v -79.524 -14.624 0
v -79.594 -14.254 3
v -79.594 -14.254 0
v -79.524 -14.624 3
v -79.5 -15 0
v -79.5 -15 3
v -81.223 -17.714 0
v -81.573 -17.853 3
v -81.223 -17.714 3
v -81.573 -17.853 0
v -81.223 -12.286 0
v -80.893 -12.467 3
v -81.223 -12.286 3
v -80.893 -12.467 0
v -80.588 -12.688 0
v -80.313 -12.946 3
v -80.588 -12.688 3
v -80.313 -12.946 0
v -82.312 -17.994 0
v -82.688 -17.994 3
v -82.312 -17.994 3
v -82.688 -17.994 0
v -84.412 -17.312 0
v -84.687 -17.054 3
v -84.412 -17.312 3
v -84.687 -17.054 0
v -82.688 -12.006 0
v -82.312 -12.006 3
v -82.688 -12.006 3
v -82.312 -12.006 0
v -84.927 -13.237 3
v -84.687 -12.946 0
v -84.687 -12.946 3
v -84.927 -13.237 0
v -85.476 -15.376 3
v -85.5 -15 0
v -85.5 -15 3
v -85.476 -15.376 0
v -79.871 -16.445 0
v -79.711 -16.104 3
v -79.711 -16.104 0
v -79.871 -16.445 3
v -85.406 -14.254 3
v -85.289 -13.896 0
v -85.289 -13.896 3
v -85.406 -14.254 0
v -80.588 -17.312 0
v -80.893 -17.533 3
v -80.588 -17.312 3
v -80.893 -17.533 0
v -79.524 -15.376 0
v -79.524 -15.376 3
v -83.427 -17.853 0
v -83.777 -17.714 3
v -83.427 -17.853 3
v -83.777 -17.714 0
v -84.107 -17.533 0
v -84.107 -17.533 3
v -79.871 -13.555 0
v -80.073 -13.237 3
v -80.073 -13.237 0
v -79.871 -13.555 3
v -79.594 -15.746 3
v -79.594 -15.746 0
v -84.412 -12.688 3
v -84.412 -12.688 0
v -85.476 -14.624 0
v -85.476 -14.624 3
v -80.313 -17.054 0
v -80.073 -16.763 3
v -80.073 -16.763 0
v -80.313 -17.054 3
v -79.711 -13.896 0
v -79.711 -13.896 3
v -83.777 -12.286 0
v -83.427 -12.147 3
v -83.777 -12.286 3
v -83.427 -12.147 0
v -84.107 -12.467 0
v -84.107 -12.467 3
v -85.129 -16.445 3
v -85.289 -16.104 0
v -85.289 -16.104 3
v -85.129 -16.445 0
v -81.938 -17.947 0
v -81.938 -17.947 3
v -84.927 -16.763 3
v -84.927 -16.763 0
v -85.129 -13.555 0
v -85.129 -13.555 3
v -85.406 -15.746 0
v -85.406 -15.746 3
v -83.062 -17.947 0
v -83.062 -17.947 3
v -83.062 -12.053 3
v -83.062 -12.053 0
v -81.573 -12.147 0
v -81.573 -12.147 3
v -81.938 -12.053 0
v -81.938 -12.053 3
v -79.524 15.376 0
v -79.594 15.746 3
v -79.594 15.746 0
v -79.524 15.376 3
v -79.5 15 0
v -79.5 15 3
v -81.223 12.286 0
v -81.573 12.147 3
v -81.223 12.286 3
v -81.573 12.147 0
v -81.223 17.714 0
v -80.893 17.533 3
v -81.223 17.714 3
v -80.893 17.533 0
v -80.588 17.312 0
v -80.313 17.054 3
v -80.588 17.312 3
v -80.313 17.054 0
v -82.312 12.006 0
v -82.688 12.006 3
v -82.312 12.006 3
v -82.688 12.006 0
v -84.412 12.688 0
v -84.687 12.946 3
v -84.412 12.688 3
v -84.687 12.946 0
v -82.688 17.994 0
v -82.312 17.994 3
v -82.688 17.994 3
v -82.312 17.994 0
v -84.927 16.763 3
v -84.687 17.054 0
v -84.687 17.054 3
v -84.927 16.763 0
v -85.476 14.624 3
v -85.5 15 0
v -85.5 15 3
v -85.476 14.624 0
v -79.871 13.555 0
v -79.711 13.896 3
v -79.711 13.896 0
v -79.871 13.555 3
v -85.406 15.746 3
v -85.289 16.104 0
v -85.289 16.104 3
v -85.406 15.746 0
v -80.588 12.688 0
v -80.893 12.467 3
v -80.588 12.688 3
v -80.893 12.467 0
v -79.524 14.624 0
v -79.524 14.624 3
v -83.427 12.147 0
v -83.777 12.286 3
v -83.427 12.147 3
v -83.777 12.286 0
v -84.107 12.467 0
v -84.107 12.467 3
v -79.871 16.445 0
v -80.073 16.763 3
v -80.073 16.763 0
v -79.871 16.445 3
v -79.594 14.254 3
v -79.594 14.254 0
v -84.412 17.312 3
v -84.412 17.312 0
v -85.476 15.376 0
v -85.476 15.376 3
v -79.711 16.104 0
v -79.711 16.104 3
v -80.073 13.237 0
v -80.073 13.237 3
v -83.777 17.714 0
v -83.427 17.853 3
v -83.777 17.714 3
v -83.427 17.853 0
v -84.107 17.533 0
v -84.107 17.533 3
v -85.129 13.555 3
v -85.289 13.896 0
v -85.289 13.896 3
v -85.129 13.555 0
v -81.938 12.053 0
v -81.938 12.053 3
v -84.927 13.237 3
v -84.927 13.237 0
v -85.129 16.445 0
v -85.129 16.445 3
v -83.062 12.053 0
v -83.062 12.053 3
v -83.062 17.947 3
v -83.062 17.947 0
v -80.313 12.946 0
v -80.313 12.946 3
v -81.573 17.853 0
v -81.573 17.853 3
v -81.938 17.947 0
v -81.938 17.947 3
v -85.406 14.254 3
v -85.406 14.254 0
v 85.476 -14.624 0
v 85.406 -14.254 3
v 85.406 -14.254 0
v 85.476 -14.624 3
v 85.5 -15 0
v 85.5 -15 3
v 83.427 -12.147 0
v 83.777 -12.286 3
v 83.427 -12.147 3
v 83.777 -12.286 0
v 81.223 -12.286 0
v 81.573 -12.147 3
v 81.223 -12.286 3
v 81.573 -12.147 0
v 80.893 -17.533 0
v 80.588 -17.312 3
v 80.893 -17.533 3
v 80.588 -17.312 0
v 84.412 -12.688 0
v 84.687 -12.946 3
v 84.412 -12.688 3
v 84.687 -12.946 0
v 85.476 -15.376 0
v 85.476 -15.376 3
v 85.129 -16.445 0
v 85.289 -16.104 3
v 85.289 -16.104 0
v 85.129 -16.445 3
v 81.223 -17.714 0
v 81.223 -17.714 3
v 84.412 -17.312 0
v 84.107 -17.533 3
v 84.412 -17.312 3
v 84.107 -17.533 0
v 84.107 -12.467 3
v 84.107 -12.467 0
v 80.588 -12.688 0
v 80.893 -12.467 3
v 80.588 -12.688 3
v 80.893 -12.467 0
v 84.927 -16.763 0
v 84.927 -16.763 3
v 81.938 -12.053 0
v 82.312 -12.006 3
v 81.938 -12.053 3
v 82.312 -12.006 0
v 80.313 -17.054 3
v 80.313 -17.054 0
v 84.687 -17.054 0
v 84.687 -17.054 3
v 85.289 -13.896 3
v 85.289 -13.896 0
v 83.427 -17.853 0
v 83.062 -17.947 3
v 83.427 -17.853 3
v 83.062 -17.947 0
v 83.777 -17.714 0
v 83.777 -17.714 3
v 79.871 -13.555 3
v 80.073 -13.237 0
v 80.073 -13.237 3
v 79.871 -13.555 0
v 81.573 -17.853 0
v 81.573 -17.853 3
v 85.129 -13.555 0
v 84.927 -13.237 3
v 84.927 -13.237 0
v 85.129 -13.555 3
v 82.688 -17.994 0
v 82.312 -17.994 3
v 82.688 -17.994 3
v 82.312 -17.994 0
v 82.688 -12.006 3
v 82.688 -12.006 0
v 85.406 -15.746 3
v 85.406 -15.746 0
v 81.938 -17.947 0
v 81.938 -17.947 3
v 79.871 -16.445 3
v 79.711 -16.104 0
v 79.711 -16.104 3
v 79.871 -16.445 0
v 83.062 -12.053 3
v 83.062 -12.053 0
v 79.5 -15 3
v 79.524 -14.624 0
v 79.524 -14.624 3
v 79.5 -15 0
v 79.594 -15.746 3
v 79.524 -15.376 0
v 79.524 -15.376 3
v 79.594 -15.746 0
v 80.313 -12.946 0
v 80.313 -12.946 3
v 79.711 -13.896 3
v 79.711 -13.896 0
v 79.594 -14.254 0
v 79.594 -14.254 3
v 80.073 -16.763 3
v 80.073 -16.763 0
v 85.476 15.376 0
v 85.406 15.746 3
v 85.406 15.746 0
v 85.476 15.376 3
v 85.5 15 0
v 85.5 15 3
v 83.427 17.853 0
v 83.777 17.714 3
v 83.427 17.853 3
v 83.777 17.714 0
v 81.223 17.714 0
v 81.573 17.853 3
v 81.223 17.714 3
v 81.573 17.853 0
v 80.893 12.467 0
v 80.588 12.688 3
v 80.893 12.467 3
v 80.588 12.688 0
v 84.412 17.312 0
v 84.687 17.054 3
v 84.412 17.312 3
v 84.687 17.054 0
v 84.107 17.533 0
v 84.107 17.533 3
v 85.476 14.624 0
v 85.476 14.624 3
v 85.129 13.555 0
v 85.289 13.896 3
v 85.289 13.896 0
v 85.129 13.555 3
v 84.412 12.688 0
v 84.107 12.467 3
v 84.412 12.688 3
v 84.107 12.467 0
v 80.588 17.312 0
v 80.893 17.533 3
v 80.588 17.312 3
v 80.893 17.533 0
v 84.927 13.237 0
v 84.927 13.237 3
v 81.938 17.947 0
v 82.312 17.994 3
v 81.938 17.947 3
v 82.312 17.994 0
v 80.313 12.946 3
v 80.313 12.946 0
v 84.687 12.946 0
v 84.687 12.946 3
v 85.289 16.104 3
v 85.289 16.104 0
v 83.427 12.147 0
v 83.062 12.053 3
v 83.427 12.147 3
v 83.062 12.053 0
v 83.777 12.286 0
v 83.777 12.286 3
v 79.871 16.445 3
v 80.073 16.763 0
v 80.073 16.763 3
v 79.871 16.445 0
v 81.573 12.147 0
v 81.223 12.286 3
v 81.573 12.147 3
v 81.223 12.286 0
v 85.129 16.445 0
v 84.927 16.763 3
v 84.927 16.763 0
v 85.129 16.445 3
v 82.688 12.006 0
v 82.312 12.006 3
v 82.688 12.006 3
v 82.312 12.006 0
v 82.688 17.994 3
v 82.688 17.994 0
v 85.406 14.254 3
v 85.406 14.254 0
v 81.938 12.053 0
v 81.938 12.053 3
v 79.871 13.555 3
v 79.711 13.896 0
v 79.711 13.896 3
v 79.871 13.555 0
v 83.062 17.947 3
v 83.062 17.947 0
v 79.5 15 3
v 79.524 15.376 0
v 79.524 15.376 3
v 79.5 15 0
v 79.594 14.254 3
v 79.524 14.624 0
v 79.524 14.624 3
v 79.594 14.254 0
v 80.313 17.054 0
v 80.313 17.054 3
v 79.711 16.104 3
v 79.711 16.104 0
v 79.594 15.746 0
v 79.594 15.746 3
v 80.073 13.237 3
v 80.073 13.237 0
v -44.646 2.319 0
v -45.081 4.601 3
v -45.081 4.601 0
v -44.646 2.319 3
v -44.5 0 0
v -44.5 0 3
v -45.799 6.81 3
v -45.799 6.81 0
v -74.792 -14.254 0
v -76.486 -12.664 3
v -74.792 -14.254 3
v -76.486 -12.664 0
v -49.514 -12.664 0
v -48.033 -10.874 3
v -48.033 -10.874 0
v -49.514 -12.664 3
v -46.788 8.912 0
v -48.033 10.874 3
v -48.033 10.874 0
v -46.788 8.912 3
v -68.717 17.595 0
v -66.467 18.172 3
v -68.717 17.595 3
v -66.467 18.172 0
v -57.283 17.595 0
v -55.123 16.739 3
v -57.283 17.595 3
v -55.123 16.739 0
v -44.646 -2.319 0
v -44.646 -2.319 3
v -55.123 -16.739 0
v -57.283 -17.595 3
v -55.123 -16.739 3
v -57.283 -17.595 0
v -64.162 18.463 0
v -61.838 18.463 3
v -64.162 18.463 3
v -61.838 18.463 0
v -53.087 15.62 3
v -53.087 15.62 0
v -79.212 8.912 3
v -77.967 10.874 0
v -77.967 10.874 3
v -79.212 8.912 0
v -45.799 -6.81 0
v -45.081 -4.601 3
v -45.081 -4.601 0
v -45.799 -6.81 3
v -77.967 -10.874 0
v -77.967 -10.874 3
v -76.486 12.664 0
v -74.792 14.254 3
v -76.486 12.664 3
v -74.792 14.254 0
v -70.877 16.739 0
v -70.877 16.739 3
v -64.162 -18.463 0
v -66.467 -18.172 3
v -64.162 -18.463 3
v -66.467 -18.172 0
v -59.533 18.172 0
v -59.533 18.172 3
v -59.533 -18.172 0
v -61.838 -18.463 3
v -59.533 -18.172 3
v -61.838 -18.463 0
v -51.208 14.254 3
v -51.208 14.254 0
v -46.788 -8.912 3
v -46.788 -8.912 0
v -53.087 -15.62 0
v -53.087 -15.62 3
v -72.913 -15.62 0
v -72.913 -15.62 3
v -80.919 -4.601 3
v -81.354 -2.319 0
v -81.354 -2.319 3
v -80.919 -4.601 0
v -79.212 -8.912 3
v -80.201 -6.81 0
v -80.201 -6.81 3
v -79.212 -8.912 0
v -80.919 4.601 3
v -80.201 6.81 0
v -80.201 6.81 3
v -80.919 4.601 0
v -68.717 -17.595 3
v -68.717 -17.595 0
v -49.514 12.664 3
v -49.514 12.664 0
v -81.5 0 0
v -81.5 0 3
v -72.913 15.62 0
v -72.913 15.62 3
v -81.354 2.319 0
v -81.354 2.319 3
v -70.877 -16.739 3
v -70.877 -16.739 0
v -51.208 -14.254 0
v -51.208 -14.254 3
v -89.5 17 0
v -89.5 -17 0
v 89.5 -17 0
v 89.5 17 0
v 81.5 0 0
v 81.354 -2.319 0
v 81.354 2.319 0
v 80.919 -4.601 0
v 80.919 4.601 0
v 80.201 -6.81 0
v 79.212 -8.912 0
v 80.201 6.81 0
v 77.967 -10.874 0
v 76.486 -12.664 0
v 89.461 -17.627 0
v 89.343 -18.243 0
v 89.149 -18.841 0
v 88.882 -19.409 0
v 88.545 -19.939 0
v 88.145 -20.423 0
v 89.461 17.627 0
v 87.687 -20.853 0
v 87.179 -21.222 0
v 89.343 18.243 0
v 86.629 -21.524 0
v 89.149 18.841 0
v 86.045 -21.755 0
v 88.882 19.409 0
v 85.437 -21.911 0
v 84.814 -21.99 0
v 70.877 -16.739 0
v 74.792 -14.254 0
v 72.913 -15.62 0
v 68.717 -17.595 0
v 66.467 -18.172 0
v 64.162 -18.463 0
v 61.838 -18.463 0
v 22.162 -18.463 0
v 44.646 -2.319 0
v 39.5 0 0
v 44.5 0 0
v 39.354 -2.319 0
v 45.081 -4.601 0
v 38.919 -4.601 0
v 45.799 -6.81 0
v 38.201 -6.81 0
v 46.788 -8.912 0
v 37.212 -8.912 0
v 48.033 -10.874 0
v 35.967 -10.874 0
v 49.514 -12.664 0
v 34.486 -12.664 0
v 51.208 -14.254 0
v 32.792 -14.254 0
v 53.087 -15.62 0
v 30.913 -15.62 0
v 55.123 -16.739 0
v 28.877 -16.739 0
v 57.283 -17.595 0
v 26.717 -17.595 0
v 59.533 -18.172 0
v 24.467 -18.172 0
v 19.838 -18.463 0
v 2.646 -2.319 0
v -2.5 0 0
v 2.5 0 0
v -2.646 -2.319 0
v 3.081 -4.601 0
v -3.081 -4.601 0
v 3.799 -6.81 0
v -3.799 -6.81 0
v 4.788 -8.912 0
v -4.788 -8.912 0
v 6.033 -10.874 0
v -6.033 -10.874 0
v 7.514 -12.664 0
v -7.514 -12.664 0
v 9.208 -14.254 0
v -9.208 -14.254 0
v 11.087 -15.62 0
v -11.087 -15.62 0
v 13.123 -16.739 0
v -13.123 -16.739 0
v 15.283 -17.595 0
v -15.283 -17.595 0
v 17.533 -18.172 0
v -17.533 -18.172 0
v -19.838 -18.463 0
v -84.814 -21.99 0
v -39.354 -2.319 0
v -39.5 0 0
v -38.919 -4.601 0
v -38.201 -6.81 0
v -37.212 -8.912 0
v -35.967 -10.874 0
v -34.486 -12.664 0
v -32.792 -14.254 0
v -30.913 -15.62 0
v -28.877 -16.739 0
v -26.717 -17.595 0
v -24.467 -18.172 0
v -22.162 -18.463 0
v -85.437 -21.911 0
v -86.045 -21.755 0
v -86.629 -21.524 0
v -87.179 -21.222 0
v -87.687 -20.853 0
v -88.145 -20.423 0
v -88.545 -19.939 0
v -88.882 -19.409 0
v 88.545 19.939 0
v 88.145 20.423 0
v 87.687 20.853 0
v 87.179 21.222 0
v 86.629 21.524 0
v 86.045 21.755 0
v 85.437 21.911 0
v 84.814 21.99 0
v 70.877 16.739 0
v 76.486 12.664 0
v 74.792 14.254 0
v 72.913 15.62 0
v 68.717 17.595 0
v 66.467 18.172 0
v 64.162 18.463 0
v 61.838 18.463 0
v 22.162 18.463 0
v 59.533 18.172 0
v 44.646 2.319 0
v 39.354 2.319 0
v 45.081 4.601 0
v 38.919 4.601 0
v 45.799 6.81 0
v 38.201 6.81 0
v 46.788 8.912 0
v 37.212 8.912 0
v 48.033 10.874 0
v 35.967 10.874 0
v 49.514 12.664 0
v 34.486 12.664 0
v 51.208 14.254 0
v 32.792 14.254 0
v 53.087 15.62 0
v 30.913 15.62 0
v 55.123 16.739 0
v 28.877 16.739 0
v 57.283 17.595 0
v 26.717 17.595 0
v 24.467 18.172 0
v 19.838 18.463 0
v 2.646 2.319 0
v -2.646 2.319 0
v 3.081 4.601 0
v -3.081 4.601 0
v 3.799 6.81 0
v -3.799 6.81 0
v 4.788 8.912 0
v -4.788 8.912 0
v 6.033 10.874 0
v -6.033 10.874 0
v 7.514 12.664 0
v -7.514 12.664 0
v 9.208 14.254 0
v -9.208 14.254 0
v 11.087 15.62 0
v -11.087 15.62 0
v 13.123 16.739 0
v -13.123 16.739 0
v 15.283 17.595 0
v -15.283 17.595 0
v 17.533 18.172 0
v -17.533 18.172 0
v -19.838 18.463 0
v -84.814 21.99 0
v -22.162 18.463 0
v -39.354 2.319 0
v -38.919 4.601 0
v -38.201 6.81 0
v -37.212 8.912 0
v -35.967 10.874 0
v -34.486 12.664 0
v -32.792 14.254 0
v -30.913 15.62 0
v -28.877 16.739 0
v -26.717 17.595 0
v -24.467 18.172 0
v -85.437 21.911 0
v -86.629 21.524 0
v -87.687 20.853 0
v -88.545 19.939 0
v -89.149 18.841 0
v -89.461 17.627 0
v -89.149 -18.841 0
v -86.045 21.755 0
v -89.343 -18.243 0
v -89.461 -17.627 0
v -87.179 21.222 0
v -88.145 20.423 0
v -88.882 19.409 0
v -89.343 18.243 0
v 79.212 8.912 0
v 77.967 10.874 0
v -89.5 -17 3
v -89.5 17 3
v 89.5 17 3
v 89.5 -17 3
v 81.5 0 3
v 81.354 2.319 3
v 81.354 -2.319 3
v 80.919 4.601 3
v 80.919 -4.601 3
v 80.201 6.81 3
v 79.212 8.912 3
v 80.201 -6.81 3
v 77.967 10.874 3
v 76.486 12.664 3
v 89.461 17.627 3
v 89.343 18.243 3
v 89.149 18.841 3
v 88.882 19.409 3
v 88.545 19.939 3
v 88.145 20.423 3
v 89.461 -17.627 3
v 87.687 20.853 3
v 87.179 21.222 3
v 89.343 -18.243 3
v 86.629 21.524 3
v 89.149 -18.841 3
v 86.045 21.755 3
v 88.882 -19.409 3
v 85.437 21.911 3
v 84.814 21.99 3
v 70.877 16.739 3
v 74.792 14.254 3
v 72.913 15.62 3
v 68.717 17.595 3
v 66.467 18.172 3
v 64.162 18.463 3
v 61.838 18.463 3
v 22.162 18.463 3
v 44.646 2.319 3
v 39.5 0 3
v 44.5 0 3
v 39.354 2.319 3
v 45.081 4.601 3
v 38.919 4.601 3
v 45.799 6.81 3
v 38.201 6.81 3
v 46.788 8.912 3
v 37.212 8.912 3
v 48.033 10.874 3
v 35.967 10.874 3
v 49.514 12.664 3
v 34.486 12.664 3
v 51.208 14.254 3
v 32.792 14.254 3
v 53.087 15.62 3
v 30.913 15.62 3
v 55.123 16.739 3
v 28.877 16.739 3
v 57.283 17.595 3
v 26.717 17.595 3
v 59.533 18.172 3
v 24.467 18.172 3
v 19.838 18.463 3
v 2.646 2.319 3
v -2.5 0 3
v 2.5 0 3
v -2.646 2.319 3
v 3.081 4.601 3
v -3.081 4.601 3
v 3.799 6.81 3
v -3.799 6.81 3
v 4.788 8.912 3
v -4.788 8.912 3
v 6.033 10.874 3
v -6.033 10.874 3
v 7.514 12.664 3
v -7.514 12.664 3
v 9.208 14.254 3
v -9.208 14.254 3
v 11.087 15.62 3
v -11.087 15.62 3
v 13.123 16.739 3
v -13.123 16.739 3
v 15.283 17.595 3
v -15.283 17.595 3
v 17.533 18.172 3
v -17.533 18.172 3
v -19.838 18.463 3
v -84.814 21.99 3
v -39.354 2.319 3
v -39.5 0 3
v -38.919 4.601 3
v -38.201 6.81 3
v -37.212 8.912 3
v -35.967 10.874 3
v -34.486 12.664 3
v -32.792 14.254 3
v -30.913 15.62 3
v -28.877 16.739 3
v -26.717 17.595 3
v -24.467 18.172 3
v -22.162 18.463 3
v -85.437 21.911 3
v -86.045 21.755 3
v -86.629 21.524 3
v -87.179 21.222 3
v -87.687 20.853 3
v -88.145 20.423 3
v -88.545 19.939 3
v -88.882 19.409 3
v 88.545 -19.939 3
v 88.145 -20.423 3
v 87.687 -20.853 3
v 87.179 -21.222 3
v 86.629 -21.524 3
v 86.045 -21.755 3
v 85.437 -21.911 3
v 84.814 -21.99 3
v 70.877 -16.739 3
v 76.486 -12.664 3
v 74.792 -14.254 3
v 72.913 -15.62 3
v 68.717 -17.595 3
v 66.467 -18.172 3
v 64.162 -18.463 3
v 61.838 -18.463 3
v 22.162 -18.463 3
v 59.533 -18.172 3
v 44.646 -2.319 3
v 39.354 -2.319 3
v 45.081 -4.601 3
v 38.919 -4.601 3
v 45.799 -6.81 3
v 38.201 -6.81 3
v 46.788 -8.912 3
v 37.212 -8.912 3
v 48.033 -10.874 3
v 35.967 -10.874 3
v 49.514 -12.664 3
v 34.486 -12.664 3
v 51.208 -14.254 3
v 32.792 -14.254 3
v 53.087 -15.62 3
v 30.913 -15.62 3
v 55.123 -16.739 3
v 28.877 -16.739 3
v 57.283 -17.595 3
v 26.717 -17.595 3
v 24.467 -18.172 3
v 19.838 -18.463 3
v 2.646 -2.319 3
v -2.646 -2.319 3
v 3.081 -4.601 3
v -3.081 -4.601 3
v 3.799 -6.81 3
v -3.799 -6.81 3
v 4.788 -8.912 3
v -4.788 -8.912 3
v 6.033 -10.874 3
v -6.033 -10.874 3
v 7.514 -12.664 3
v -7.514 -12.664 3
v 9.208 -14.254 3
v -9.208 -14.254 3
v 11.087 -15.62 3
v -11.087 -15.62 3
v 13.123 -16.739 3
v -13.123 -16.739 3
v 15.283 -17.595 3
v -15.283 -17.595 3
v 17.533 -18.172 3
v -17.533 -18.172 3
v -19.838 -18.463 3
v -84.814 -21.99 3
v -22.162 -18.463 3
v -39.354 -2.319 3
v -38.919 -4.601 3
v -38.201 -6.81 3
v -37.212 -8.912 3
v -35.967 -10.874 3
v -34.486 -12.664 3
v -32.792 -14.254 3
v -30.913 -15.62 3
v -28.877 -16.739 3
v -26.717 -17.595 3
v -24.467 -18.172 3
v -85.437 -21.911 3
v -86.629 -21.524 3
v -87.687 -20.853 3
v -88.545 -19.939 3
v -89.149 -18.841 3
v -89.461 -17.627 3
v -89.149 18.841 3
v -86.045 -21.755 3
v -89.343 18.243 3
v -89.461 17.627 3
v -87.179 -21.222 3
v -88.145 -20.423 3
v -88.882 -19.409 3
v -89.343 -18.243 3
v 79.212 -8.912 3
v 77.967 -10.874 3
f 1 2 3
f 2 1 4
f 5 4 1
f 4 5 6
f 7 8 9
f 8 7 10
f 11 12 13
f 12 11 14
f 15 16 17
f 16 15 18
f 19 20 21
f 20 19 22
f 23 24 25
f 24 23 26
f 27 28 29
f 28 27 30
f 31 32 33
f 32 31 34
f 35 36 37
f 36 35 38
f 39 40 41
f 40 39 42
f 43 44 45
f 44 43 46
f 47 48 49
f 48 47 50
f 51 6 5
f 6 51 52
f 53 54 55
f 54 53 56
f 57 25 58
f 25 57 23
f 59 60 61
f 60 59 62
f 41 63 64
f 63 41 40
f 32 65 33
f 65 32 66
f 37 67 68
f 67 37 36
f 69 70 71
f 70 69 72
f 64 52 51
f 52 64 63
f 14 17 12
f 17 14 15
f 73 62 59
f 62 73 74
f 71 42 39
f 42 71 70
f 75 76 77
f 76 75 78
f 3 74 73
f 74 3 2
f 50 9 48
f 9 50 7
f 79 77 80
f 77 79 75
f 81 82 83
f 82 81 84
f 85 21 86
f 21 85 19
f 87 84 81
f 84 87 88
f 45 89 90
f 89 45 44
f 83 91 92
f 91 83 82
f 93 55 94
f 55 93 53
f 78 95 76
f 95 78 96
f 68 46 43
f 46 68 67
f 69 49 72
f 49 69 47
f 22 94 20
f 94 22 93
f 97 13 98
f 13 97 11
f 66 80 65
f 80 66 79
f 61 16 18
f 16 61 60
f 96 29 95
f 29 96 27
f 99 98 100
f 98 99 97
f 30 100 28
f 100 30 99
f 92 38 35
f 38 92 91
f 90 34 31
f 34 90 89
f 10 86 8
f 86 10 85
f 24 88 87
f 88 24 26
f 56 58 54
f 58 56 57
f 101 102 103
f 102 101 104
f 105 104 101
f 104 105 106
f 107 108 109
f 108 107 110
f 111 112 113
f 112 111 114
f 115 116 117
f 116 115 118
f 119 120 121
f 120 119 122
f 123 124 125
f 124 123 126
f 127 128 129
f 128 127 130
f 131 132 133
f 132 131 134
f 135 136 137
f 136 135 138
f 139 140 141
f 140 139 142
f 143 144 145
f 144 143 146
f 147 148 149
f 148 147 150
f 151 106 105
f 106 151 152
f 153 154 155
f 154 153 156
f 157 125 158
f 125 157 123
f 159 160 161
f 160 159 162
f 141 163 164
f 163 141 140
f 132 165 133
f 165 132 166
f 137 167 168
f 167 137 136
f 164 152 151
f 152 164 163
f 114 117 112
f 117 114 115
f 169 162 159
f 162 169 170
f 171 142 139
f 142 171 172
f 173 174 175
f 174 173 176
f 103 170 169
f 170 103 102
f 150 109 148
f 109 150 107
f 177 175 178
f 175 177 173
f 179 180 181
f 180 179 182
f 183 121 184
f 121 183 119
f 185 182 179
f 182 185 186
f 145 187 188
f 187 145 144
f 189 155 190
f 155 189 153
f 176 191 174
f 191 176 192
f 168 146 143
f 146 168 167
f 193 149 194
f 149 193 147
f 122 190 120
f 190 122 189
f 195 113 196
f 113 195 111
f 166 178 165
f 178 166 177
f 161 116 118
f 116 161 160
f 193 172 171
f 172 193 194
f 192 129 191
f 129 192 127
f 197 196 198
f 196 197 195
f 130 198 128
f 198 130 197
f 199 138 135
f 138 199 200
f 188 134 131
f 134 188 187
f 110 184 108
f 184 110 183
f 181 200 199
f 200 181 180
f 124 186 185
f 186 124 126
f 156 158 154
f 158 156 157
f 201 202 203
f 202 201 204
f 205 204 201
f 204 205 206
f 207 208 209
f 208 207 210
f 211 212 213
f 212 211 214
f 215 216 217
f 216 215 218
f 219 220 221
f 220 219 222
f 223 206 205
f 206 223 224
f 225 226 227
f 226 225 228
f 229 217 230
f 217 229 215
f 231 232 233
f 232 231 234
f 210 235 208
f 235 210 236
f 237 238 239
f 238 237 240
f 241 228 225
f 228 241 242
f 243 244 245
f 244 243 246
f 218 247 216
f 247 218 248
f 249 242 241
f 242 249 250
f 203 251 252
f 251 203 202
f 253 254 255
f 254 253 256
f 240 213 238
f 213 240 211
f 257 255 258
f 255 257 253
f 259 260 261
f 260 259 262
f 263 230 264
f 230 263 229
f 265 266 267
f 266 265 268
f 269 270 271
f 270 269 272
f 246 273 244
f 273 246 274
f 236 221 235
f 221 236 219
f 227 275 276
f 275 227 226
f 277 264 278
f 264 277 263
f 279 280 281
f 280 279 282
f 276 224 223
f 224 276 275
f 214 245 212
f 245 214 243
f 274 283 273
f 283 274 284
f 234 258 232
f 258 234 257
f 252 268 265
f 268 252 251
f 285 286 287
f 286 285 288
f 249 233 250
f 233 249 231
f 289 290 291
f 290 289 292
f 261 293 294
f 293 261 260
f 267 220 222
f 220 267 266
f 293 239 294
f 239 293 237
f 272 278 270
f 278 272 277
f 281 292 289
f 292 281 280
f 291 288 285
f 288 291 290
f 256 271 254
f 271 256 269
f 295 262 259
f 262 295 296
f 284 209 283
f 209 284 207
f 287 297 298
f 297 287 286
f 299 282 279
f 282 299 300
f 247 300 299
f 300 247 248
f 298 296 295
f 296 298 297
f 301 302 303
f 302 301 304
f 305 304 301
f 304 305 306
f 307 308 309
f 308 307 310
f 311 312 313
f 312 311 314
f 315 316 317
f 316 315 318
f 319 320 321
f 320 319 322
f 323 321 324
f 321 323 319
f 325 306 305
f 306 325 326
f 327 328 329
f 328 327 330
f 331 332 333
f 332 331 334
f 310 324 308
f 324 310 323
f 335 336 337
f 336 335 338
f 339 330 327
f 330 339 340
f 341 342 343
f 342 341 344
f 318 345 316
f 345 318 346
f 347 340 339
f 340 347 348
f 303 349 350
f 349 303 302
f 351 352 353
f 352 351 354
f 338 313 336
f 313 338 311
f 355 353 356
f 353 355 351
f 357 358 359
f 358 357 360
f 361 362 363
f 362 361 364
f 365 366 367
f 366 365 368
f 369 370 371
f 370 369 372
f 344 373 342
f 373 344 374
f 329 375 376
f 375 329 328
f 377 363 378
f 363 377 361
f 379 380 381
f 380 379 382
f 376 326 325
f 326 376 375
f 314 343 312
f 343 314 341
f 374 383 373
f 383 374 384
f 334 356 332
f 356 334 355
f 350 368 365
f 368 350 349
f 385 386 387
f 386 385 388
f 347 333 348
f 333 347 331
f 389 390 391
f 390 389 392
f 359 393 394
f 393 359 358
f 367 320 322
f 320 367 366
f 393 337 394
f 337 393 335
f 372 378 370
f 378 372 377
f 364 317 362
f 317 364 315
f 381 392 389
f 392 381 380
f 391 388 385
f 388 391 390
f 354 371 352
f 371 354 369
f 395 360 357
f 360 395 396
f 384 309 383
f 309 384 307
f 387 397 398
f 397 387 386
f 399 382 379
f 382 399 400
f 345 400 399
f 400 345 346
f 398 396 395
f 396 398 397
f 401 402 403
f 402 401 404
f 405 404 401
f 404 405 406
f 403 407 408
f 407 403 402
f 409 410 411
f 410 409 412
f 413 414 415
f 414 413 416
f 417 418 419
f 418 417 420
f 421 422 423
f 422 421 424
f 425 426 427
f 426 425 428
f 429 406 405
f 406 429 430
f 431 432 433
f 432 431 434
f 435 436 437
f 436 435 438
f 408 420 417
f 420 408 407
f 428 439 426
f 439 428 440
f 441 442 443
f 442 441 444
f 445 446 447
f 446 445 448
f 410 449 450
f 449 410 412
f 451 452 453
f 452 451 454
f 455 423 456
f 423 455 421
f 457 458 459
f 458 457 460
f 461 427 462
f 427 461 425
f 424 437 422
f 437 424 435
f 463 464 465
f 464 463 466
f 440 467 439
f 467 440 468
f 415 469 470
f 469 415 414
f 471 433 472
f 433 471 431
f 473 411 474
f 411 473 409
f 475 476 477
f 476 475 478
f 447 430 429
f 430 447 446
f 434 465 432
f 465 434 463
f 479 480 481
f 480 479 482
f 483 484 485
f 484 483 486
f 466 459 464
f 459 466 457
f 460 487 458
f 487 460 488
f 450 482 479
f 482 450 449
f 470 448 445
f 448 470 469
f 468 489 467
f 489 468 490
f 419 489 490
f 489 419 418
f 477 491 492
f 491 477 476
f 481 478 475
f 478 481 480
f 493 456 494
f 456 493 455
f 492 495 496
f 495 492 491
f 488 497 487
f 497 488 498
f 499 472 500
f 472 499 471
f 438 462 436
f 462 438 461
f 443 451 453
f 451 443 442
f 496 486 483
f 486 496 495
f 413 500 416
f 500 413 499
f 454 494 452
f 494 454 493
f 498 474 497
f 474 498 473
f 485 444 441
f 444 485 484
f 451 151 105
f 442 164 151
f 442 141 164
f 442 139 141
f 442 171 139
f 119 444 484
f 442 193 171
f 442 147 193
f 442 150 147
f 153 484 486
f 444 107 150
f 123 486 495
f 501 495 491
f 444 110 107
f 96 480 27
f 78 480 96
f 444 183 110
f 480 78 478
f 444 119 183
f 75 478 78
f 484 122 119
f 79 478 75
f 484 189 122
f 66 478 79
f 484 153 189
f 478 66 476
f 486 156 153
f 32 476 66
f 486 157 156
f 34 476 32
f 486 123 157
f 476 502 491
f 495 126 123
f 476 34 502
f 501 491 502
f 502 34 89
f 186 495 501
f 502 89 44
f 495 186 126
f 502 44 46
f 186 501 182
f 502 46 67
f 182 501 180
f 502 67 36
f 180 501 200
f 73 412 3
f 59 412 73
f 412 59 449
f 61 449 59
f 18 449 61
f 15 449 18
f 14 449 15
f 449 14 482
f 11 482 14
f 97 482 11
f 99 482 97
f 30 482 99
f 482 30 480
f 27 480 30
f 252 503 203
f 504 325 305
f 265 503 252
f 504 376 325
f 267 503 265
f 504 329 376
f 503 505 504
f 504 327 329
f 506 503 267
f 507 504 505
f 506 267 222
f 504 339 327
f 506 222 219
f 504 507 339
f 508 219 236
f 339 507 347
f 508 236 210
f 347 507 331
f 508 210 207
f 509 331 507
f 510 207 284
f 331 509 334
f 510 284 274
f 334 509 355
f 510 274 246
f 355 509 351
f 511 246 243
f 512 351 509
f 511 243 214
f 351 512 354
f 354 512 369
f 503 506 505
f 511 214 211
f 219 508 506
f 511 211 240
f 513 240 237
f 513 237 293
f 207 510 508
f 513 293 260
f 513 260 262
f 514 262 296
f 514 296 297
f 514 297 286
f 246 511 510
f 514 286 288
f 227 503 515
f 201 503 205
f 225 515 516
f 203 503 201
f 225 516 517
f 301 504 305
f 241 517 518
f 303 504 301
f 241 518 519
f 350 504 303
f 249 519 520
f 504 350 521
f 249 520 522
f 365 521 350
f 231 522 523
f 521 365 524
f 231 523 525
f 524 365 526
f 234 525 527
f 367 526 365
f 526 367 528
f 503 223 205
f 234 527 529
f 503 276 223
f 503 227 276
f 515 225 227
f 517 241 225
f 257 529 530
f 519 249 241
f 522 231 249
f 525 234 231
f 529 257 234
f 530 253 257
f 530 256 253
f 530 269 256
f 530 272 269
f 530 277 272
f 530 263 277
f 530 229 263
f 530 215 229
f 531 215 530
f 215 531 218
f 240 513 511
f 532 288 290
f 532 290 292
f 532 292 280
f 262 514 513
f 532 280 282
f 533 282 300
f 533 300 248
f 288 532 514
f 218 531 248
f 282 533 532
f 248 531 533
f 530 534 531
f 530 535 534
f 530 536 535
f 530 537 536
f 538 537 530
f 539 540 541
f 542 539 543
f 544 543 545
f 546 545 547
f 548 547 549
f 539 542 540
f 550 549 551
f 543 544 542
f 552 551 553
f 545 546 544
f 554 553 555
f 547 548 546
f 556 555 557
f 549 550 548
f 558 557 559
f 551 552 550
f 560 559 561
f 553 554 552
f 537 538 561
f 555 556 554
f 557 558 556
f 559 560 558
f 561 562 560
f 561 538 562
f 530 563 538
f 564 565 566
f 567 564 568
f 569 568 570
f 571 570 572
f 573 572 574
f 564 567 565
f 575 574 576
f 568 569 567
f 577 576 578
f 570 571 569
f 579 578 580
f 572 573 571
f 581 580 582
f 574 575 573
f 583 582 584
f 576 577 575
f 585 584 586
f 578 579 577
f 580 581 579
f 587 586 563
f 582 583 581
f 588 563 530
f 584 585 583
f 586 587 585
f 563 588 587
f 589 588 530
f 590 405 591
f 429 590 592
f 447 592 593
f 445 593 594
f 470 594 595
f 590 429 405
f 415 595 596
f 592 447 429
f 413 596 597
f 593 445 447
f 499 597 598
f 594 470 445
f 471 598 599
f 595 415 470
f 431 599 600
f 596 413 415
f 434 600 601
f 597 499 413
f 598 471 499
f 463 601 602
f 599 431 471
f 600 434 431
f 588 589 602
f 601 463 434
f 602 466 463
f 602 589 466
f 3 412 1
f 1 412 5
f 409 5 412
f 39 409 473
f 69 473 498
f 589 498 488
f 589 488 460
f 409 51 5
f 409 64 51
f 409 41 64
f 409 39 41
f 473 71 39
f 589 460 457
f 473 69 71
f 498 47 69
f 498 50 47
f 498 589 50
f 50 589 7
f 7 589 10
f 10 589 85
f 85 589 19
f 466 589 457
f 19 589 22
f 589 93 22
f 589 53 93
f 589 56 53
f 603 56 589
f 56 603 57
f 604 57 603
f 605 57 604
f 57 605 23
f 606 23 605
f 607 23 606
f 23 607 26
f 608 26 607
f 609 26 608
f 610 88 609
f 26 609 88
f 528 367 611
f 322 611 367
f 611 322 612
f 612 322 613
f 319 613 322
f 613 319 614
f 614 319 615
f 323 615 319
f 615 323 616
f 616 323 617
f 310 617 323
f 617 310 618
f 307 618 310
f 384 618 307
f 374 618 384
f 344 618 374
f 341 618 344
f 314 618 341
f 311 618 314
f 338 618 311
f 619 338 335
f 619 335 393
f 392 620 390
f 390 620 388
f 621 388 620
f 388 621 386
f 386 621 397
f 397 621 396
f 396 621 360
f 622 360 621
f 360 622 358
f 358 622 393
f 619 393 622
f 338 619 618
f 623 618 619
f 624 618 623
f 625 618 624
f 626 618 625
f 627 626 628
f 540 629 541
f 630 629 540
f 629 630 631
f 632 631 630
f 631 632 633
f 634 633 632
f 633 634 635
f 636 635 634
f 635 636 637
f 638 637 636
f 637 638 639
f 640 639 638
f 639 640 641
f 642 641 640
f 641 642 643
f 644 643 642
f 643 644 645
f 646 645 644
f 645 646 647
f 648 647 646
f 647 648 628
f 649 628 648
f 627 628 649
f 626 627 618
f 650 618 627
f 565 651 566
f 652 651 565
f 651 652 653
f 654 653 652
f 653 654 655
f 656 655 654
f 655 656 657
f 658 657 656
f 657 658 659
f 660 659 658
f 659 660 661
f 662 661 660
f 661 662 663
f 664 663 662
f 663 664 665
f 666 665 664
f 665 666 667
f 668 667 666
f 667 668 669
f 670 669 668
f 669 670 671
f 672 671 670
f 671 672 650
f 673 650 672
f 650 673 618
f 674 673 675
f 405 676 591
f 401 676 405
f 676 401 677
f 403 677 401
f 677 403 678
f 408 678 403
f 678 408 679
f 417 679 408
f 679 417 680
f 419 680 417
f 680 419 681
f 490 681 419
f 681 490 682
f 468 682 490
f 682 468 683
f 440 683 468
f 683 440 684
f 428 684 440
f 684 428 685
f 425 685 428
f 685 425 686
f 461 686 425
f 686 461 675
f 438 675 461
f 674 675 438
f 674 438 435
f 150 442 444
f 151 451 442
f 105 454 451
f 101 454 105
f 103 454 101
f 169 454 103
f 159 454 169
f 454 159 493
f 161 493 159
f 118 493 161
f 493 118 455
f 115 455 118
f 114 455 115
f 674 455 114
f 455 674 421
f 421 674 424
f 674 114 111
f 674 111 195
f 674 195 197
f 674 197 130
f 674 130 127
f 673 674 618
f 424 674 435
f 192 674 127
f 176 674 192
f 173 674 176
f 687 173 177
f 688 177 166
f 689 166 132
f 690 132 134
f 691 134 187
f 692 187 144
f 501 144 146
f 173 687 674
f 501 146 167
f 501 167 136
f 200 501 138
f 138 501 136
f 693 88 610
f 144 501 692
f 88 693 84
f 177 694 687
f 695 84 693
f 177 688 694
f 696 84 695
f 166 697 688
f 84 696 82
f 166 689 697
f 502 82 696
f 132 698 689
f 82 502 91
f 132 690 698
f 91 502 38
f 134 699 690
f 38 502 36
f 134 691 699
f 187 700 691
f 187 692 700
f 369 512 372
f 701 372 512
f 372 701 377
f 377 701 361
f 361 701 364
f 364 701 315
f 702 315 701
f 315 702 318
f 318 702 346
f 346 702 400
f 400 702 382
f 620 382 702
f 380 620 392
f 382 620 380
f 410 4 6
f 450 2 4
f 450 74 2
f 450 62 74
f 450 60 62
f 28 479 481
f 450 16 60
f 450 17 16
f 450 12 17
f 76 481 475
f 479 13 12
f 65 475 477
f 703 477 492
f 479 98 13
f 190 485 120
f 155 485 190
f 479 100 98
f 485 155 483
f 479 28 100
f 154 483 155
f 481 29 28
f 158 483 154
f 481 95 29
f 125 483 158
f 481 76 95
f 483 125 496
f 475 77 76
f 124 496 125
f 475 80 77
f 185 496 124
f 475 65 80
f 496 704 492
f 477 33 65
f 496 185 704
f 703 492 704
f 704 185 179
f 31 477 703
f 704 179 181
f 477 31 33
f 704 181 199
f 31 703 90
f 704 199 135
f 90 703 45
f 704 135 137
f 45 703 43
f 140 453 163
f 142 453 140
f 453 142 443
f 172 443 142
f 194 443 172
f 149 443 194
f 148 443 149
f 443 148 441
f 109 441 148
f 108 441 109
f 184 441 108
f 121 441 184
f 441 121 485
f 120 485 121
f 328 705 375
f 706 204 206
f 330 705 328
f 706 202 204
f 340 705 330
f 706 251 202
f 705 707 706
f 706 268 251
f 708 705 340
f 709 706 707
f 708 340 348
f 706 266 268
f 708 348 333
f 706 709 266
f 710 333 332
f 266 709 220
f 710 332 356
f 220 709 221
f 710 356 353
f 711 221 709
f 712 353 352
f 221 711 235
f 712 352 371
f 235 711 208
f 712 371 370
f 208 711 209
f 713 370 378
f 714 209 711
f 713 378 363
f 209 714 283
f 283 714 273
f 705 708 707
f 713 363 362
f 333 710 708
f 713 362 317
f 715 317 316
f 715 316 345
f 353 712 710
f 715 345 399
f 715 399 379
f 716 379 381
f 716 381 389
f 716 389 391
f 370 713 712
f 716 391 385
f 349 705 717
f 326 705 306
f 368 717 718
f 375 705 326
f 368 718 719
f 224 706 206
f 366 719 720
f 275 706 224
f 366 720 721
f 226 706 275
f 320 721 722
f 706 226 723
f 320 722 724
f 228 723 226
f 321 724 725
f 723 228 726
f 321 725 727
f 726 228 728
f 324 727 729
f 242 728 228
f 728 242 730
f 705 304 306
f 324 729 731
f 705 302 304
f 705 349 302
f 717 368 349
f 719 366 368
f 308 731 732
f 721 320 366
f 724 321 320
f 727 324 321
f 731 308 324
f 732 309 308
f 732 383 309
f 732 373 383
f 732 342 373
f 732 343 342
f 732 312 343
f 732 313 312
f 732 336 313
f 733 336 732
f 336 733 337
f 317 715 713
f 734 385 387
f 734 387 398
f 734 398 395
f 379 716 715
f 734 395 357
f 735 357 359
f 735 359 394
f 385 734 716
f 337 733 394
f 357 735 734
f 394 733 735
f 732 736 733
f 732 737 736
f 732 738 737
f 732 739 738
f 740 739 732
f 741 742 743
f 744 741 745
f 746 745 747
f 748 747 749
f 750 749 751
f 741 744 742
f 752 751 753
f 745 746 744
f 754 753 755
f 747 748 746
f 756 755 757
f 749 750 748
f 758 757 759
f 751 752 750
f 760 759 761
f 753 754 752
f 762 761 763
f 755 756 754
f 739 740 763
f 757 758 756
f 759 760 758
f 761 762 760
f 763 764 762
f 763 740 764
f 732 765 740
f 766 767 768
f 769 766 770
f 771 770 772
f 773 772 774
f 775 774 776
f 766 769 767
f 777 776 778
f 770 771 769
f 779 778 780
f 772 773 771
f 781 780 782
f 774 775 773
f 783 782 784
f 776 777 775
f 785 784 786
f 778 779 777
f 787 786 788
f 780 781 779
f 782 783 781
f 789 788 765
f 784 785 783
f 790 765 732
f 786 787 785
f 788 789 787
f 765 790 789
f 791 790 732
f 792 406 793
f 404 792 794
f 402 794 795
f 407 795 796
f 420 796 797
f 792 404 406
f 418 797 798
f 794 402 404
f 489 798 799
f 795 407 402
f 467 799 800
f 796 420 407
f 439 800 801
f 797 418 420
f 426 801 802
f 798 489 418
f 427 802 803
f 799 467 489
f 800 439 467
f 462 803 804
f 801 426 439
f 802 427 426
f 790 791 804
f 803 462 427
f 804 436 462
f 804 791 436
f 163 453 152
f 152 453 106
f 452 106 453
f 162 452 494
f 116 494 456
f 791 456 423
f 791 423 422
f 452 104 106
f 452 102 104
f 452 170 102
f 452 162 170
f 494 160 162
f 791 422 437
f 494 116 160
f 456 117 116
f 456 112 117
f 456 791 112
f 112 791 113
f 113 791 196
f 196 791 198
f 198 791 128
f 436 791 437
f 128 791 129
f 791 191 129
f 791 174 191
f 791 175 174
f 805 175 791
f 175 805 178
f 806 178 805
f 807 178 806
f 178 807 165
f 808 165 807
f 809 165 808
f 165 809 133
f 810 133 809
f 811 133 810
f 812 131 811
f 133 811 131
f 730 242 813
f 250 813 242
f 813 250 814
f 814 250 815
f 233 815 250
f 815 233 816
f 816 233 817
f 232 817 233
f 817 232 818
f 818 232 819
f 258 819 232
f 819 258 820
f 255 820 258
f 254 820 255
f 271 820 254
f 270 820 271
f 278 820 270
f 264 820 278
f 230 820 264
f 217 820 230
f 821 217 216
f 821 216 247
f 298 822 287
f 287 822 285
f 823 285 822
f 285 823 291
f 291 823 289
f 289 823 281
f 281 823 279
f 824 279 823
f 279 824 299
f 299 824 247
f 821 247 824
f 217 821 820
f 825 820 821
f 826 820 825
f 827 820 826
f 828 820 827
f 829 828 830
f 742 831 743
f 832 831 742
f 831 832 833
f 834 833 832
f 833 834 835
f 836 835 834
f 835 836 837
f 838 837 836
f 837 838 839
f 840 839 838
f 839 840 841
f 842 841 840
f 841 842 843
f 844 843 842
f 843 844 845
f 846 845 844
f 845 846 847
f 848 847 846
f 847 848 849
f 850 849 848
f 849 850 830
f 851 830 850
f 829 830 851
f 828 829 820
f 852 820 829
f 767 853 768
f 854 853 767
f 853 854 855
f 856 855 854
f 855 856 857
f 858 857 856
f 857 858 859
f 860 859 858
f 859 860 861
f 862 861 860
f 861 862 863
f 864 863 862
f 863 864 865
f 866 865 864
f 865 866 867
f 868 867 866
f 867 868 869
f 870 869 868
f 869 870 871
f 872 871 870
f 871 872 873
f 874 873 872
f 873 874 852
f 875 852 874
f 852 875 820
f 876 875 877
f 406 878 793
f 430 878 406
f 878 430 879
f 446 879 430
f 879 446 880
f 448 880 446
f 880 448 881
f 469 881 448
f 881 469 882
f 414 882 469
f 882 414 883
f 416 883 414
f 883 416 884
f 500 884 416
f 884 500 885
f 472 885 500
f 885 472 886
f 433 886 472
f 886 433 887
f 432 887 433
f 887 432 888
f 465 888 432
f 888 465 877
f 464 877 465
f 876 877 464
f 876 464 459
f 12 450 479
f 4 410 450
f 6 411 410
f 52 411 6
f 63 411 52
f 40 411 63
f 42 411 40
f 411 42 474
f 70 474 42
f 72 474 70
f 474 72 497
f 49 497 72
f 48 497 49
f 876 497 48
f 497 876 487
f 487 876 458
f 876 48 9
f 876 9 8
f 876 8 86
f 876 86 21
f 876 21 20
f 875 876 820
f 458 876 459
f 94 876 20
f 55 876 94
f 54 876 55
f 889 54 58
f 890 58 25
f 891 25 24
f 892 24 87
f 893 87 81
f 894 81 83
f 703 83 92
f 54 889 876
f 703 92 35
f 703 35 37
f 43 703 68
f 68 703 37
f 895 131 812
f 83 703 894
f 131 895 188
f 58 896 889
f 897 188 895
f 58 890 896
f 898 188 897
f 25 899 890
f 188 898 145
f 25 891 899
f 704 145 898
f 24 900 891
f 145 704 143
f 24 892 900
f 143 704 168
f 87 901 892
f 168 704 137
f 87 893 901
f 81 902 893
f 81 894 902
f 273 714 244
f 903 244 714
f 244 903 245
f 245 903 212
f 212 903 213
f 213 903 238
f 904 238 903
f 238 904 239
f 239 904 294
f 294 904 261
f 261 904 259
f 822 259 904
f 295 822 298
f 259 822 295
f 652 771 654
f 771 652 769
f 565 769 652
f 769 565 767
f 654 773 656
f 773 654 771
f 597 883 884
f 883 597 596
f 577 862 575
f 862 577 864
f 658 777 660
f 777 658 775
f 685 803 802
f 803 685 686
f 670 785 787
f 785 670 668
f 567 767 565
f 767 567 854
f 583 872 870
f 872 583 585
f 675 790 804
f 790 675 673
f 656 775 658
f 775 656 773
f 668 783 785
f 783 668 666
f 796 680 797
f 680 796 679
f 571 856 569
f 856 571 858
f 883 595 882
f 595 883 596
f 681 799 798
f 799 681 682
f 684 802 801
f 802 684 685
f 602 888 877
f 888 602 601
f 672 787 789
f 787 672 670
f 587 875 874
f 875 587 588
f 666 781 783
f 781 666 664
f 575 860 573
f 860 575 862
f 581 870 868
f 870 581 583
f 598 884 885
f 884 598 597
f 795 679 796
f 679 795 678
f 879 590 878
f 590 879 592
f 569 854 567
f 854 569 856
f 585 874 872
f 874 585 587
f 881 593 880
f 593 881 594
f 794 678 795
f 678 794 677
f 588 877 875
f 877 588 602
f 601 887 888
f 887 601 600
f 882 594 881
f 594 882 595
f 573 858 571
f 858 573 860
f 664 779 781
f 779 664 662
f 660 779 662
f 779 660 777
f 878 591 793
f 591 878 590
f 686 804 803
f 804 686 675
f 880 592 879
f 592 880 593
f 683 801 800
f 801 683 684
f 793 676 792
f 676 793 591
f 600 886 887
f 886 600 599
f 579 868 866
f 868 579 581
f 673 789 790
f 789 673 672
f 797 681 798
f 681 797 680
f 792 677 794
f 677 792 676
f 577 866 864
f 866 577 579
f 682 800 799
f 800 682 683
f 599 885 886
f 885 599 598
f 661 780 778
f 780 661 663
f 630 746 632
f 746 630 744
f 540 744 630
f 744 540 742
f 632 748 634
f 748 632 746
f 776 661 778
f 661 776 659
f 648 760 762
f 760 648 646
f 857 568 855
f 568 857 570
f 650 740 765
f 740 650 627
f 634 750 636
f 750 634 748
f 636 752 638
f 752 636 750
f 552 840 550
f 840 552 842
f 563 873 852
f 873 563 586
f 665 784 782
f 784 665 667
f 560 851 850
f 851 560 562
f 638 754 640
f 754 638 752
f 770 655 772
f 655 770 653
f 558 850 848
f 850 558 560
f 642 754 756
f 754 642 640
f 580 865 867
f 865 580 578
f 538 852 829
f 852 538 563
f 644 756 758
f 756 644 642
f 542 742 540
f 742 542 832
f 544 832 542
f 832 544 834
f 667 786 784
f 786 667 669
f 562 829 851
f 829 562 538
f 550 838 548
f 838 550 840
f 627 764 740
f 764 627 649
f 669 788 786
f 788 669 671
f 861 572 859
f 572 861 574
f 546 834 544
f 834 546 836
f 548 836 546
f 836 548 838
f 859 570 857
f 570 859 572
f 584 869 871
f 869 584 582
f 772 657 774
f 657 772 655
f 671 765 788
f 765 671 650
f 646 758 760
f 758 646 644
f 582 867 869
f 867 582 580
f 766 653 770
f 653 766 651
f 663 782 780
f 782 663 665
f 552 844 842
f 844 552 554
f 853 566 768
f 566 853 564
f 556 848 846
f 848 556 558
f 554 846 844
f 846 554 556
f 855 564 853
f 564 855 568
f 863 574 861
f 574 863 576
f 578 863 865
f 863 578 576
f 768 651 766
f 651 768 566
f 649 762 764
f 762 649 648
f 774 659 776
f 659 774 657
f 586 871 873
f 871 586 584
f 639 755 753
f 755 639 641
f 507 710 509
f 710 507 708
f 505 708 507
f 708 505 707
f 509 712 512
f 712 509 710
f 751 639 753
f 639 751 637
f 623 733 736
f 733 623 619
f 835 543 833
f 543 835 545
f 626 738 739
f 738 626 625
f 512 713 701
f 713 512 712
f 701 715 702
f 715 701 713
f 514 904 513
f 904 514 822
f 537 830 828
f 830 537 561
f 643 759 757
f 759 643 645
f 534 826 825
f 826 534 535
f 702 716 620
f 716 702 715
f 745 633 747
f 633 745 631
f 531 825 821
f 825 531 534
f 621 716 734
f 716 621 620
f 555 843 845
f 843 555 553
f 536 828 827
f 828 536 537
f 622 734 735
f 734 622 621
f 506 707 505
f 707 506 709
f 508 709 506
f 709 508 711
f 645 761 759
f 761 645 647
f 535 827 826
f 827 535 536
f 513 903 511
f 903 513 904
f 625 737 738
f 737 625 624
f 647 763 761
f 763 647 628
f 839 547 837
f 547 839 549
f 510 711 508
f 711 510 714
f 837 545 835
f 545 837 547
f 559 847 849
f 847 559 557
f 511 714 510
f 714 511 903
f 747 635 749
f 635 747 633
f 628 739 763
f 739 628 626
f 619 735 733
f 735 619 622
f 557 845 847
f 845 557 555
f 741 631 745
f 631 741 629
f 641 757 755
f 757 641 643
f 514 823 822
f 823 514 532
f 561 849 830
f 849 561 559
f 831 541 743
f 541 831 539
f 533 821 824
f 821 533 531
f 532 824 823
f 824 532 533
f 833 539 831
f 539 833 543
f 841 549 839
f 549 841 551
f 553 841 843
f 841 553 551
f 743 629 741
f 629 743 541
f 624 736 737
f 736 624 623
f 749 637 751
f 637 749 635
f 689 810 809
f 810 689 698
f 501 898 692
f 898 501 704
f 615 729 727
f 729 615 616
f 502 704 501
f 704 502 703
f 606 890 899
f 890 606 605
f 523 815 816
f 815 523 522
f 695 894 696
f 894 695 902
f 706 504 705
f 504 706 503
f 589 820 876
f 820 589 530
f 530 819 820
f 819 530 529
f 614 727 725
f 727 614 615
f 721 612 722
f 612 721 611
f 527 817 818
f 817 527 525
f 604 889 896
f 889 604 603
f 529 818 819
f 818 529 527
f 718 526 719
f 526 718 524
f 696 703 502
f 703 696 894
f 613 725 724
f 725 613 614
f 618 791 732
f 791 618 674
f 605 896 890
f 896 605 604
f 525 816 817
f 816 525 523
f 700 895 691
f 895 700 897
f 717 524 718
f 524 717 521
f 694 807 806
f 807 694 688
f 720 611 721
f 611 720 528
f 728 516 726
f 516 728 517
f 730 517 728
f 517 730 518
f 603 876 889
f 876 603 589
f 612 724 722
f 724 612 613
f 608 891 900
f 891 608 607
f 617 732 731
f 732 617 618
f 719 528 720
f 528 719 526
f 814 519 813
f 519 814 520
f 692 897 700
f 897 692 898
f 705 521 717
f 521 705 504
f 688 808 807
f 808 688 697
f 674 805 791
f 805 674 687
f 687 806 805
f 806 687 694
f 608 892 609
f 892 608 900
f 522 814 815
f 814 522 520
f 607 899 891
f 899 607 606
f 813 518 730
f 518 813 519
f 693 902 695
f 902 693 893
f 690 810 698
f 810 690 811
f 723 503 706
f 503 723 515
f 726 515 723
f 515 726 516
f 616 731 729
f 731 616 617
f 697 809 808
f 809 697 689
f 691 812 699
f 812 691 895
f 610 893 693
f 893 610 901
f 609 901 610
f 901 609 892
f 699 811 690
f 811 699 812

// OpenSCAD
$fn = 50;


difference() {
	union() {
		hull() {
			translate(v = [-84.5000000000, 17.0000000000, 0]) {
				cylinder(h = 3, r = 5);
			}
			translate(v = [84.5000000000, 17.0000000000, 0]) {
				cylinder(h = 3, r = 5);
			}
			translate(v = [-84.5000000000, -17.0000000000, 0]) {
				cylinder(h = 3, r = 5);
			}
			translate(v = [84.5000000000, -17.0000000000, 0]) {
				cylinder(h = 3, r = 5);
			}
		}
	}
	union() {
		#translate(v = [-82.5000000000, -15.0000000000, -100.0000000000]) {
			cylinder(h = 200, r = 3.0000000000);
		}
		#translate(v = [-82.5000000000, 15.0000000000, -100.0000000000]) {
			cylinder(h = 200, r = 3.0000000000);
		}
		#translate(v = [82.5000000000, -15.0000000000, -100.0000000000]) {
			cylinder(h = 200, r = 3.0000000000);
		}
		#translate(v = [82.5000000000, 15.0000000000, -100.0000000000]) {
			cylinder(h = 200, r = 3.0000000000);
		}
		#translate(v = [-63.0000000000, 0, 0]) {
			cylinder(h = 3, r = 18.5000000000);
		}
		#translate(v = [-21.0000000000, 0, 0]) {
			cylinder(h = 3, r = 18.5000000000);
		}
		#translate(v = [21.0000000000, 0, 0]) {
			cylinder(h = 3, r = 18.5000000000);
		}
		#translate(v = [63.0000000000, 0, 0]) {
			cylinder(h = 3, r = 18.5000000000);
		}
	}
}
